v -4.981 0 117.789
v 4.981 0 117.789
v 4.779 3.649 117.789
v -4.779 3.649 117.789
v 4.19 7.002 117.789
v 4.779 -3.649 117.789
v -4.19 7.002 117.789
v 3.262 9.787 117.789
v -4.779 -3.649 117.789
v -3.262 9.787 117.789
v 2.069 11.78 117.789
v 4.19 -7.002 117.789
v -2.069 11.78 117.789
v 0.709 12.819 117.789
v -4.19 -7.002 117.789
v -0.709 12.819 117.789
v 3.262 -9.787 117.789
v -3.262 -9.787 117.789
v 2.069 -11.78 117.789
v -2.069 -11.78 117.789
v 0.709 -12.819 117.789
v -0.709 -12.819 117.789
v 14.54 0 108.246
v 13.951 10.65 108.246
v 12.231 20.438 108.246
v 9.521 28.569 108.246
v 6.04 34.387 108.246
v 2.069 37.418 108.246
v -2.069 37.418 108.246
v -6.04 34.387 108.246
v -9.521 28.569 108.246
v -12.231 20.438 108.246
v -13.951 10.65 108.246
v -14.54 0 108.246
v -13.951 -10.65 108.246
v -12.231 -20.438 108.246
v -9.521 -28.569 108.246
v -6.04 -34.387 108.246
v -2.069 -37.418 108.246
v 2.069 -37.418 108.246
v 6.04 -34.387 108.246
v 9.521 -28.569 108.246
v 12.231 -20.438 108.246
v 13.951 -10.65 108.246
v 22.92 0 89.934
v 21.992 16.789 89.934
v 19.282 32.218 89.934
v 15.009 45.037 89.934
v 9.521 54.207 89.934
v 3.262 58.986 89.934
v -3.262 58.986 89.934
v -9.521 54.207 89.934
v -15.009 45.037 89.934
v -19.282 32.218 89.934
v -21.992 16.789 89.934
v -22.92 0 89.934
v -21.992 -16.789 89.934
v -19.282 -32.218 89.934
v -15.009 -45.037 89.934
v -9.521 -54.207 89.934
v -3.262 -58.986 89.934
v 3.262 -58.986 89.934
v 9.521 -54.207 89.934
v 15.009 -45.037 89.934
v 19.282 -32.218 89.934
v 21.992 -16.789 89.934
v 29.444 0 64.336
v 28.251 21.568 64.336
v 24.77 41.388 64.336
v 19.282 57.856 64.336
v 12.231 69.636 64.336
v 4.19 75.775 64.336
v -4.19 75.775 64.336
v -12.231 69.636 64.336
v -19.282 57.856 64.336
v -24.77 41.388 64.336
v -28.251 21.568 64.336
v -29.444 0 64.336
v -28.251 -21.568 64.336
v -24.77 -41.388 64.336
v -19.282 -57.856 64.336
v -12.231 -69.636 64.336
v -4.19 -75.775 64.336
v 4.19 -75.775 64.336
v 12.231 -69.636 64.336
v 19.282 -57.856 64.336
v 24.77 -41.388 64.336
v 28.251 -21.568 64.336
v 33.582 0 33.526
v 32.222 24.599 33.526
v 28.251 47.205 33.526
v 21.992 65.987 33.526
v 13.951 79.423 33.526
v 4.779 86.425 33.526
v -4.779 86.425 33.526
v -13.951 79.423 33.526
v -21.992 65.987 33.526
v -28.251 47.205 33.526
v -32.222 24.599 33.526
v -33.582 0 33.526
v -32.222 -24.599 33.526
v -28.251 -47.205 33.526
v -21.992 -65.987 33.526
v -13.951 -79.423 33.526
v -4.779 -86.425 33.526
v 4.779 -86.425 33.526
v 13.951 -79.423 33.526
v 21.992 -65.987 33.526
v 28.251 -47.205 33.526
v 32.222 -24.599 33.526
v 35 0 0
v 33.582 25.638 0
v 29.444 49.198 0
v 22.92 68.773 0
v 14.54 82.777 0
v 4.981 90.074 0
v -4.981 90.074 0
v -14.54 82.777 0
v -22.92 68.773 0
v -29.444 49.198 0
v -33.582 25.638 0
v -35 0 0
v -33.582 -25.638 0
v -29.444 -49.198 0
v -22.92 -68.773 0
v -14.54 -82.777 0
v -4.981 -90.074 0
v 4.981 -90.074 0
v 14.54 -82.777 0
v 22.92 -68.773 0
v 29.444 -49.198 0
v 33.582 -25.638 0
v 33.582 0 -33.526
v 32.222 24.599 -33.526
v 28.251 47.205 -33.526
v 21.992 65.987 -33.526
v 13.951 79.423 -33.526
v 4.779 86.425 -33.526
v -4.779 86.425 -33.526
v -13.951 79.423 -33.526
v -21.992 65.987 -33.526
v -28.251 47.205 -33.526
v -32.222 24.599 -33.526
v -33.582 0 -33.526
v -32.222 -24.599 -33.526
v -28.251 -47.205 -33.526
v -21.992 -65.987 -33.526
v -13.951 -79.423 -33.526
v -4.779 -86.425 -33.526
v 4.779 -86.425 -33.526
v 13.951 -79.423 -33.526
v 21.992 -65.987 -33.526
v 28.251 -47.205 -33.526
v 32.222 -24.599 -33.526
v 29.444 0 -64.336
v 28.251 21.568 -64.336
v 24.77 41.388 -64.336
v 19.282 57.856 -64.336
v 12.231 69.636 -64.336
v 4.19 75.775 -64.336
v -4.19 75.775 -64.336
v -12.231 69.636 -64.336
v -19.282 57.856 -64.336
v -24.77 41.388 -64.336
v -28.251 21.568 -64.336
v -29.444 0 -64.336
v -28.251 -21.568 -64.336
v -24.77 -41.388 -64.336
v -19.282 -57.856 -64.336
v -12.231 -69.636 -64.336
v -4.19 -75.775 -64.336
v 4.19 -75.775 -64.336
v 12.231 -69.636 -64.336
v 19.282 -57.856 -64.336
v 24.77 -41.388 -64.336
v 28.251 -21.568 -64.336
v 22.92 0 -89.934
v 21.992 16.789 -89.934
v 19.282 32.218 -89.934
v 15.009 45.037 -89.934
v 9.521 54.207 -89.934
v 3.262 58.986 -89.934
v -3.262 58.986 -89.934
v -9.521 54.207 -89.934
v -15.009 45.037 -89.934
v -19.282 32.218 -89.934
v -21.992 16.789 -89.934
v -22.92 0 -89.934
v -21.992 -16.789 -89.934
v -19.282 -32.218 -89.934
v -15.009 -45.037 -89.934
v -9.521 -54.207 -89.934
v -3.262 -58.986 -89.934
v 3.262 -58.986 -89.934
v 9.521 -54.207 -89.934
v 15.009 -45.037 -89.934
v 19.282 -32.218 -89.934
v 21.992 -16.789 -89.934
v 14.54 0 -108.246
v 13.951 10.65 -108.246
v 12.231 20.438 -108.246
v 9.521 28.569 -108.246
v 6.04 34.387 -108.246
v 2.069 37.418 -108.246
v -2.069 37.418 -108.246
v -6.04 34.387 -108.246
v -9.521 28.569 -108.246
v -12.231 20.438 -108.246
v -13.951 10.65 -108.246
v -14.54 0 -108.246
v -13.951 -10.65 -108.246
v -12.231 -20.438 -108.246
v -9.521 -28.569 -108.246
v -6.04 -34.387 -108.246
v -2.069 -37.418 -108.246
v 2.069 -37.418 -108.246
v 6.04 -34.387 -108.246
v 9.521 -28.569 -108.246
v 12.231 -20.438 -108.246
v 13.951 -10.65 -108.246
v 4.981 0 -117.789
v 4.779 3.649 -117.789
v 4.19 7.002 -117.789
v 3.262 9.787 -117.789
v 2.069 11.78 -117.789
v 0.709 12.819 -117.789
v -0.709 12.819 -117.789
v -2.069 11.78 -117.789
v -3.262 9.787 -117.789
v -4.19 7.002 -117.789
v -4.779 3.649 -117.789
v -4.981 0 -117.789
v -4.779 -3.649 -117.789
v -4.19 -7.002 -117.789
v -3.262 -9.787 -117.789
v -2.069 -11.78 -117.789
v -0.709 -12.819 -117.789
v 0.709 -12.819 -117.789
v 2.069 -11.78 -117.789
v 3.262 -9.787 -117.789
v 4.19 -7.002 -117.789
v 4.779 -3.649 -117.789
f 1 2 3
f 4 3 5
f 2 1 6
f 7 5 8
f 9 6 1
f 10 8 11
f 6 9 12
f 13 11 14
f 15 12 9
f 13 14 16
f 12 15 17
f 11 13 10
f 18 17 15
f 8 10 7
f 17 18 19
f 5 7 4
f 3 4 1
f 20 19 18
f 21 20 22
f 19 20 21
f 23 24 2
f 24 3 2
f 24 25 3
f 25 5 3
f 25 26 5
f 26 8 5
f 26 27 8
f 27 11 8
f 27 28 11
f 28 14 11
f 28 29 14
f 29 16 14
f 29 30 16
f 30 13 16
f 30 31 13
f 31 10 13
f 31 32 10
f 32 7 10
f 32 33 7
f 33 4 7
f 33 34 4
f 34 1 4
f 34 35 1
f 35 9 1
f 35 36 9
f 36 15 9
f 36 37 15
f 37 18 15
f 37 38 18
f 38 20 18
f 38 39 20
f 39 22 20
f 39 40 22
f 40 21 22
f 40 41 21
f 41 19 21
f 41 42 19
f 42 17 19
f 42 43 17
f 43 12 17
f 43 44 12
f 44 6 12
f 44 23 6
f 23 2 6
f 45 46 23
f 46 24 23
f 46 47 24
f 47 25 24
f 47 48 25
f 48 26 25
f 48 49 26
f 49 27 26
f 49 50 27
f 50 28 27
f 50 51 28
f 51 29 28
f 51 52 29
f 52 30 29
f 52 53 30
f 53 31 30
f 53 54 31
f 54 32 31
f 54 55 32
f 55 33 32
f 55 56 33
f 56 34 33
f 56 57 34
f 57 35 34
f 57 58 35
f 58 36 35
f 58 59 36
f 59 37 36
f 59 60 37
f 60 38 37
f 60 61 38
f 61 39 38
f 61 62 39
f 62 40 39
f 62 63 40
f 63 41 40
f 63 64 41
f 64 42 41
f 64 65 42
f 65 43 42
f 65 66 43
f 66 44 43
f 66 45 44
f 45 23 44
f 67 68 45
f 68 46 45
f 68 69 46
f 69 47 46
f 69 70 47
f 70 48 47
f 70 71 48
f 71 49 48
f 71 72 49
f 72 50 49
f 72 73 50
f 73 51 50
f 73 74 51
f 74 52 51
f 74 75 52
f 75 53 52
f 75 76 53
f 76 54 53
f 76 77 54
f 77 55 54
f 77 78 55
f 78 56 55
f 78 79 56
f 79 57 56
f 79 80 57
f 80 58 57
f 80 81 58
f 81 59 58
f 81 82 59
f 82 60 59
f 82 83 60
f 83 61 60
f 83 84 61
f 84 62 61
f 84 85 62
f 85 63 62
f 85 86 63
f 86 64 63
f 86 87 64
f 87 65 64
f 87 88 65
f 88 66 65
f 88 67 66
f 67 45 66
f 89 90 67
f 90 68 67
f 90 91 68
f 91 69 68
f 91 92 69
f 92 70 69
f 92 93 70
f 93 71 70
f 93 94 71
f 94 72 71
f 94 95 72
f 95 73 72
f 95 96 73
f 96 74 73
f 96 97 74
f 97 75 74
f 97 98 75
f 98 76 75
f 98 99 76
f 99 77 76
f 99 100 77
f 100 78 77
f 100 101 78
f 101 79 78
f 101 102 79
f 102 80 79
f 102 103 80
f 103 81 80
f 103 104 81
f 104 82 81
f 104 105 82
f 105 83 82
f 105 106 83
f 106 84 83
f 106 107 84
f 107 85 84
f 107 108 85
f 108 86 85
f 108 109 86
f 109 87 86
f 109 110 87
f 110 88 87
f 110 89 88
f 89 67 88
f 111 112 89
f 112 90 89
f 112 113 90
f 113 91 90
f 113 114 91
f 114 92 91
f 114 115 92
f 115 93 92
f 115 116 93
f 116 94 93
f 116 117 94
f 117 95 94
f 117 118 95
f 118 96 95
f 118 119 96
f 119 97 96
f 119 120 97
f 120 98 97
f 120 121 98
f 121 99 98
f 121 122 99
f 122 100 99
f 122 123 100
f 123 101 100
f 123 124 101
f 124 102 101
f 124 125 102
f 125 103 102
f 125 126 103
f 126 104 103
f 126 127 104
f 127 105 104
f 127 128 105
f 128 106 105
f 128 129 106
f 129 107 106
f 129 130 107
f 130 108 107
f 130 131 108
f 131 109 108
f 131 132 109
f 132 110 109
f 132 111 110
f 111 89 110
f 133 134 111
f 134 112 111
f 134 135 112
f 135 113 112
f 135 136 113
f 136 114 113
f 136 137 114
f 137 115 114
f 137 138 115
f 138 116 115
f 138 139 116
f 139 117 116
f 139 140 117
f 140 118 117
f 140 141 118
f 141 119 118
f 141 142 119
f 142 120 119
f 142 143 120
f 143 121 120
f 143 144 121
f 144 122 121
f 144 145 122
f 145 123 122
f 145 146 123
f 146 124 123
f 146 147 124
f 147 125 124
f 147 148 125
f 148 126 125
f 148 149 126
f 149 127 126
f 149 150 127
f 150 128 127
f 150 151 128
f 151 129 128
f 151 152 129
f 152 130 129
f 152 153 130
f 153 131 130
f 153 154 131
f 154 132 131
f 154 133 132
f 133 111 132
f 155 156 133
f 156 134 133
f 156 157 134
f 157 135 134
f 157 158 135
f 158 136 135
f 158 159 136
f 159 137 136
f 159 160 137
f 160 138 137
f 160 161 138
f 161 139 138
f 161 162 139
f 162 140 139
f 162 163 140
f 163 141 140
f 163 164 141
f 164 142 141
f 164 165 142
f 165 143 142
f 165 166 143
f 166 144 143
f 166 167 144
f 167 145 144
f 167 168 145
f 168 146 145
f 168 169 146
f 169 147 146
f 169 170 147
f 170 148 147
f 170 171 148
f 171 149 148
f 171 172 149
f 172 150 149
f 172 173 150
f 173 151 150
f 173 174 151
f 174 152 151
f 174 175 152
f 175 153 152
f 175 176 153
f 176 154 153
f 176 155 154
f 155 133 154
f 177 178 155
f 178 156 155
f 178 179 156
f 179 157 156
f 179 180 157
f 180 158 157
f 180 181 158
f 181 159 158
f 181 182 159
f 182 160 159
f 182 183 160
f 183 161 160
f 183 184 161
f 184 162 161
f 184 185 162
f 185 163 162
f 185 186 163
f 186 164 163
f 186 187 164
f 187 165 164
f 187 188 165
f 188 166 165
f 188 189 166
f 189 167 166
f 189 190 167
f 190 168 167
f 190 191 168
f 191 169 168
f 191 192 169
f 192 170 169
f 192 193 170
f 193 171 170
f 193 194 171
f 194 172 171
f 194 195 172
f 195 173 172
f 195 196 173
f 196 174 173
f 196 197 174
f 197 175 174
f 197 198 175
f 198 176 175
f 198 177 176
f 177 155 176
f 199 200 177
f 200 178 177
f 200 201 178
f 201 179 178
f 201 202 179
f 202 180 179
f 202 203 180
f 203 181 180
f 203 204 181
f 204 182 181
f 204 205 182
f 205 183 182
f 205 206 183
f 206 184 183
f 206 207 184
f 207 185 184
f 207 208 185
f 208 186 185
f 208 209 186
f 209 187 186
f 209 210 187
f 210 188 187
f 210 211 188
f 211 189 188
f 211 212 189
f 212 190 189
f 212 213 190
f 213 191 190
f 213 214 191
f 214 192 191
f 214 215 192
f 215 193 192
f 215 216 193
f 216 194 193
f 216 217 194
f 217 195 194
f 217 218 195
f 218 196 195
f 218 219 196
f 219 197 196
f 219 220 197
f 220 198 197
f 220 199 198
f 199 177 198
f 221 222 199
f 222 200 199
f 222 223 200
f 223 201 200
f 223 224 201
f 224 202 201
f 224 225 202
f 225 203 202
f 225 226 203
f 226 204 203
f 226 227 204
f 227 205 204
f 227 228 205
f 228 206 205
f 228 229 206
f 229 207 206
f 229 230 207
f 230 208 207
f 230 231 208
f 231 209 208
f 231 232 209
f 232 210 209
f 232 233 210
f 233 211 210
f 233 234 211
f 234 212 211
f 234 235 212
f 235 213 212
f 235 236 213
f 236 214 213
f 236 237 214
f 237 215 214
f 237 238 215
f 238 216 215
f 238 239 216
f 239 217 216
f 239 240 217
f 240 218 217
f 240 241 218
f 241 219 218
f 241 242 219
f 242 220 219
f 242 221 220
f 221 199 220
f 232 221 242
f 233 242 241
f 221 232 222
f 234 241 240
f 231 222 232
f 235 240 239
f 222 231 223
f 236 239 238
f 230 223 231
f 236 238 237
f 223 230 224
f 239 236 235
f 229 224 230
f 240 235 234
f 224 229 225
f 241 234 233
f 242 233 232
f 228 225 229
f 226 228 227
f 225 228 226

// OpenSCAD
// Generated by SolidPython 1.0.1 on 2020-07-29 00:46:46


scale(v = [5, 13, 17]) {
	sphere(r = 7);
}
/***********************************************
*********      SolidPython code:      **********
************************************************
 
# import packages: SolidPython
from solid import *
from solid.utils import *
from itertools import chain, combinations, permutations


class Resize:

    def __init__(self, scad_file):
        self.scad_file = scad_file
        #self.scad_file = import_scad(scad_file)
        # cone/cylinder param:
        self.r1 = 0
        self.r2 = 0
        self.h = 0
        # rectangular prism param:
        self.w = 0
        self.l = 0
        # ellipse param:
        self.r = 0

    # import OpenScad code (file name corresponds to shape)


    # classify shape + parameters
    def assign(self, param1, param2, param3):
        if self.scad_file == 'cone.scad':
            self.r1 = param1
            self.r2 = param2
            self.h = param3
        elif self.scad_file == 'cylinder.scad':
            self.r1 = param1
            self.r2 = param2
            self.h = param3
        elif self.scad_file == 'rectangularPrism.scad':
            self.h = param1
            self.l = param2
            self.w = param3
        else:
            self.r = param1
            self.h = param2

    # resize parameters
    def iterate(self):
        x = range(3, 20, 2)
        i = 1
        if self.scad_file == 'cone.scad':
            tempList = list(permutations(x, 2))
            for temp in tempList:
                param1 = temp[0]
                param2 = temp[1]
                filepath = 'produced_scad_files/' + 'cone' + str(param1) + '_' + str(param2) + '_' + '.scad'
                scad_render_to_file(cylinder(h=param1, r1=param2, r2=0), filepath)

        elif self.scad_file == 'cylinder.scad':
            tempList = list(permutations(x, 3))
            for temp in tempList:
                param1 = temp[0]
                param2 = temp[1]
                filepath = 'produced_scad_files/' + 'cylinder' + str(param1) + '_' + str(param2) + '_' + '.scad'
                scad_render_to_file(cylinder(h=param1, r1=param2, r2=param2), filepath)

        elif self.scad_file == 'rectangularPrism.scad':
            tempList = list(permutations(x, 3))
            for temp in tempList:
                param1 = temp[0]
                param2 = temp[1]
                param3 = temp[2]
                filepath = 'produced_scad_files/' + 'rectangularPrism' + str(param1) + '_' + str(param2) + '_' + str(
                    param3) + '.scad'
                scad_render_to_file(cube(size=(param1, param2, param3)), filepath)

        elif self.scad_file == 'ellipse.scad':
            tempList = list(permutations(x, 4))
            for temp in tempList:
                param1 = temp[0]
                param2 = temp[1]
                param3 = temp[2]
                param4 = temp[3]
                filepath = 'produced_scad_files/' + 'ellipse' + str(param1) + '_' + str(param2) + '_' + str(param3) + '_' + str(param4) + '.scad'
                scad_render_to_file(scale([param1, param2, param3])(sphere(r=param4)), filepath)

    def render_to_scadfile(self):
        scad_render_to_file(scad, 'example.scad') 
 
************************************************/
